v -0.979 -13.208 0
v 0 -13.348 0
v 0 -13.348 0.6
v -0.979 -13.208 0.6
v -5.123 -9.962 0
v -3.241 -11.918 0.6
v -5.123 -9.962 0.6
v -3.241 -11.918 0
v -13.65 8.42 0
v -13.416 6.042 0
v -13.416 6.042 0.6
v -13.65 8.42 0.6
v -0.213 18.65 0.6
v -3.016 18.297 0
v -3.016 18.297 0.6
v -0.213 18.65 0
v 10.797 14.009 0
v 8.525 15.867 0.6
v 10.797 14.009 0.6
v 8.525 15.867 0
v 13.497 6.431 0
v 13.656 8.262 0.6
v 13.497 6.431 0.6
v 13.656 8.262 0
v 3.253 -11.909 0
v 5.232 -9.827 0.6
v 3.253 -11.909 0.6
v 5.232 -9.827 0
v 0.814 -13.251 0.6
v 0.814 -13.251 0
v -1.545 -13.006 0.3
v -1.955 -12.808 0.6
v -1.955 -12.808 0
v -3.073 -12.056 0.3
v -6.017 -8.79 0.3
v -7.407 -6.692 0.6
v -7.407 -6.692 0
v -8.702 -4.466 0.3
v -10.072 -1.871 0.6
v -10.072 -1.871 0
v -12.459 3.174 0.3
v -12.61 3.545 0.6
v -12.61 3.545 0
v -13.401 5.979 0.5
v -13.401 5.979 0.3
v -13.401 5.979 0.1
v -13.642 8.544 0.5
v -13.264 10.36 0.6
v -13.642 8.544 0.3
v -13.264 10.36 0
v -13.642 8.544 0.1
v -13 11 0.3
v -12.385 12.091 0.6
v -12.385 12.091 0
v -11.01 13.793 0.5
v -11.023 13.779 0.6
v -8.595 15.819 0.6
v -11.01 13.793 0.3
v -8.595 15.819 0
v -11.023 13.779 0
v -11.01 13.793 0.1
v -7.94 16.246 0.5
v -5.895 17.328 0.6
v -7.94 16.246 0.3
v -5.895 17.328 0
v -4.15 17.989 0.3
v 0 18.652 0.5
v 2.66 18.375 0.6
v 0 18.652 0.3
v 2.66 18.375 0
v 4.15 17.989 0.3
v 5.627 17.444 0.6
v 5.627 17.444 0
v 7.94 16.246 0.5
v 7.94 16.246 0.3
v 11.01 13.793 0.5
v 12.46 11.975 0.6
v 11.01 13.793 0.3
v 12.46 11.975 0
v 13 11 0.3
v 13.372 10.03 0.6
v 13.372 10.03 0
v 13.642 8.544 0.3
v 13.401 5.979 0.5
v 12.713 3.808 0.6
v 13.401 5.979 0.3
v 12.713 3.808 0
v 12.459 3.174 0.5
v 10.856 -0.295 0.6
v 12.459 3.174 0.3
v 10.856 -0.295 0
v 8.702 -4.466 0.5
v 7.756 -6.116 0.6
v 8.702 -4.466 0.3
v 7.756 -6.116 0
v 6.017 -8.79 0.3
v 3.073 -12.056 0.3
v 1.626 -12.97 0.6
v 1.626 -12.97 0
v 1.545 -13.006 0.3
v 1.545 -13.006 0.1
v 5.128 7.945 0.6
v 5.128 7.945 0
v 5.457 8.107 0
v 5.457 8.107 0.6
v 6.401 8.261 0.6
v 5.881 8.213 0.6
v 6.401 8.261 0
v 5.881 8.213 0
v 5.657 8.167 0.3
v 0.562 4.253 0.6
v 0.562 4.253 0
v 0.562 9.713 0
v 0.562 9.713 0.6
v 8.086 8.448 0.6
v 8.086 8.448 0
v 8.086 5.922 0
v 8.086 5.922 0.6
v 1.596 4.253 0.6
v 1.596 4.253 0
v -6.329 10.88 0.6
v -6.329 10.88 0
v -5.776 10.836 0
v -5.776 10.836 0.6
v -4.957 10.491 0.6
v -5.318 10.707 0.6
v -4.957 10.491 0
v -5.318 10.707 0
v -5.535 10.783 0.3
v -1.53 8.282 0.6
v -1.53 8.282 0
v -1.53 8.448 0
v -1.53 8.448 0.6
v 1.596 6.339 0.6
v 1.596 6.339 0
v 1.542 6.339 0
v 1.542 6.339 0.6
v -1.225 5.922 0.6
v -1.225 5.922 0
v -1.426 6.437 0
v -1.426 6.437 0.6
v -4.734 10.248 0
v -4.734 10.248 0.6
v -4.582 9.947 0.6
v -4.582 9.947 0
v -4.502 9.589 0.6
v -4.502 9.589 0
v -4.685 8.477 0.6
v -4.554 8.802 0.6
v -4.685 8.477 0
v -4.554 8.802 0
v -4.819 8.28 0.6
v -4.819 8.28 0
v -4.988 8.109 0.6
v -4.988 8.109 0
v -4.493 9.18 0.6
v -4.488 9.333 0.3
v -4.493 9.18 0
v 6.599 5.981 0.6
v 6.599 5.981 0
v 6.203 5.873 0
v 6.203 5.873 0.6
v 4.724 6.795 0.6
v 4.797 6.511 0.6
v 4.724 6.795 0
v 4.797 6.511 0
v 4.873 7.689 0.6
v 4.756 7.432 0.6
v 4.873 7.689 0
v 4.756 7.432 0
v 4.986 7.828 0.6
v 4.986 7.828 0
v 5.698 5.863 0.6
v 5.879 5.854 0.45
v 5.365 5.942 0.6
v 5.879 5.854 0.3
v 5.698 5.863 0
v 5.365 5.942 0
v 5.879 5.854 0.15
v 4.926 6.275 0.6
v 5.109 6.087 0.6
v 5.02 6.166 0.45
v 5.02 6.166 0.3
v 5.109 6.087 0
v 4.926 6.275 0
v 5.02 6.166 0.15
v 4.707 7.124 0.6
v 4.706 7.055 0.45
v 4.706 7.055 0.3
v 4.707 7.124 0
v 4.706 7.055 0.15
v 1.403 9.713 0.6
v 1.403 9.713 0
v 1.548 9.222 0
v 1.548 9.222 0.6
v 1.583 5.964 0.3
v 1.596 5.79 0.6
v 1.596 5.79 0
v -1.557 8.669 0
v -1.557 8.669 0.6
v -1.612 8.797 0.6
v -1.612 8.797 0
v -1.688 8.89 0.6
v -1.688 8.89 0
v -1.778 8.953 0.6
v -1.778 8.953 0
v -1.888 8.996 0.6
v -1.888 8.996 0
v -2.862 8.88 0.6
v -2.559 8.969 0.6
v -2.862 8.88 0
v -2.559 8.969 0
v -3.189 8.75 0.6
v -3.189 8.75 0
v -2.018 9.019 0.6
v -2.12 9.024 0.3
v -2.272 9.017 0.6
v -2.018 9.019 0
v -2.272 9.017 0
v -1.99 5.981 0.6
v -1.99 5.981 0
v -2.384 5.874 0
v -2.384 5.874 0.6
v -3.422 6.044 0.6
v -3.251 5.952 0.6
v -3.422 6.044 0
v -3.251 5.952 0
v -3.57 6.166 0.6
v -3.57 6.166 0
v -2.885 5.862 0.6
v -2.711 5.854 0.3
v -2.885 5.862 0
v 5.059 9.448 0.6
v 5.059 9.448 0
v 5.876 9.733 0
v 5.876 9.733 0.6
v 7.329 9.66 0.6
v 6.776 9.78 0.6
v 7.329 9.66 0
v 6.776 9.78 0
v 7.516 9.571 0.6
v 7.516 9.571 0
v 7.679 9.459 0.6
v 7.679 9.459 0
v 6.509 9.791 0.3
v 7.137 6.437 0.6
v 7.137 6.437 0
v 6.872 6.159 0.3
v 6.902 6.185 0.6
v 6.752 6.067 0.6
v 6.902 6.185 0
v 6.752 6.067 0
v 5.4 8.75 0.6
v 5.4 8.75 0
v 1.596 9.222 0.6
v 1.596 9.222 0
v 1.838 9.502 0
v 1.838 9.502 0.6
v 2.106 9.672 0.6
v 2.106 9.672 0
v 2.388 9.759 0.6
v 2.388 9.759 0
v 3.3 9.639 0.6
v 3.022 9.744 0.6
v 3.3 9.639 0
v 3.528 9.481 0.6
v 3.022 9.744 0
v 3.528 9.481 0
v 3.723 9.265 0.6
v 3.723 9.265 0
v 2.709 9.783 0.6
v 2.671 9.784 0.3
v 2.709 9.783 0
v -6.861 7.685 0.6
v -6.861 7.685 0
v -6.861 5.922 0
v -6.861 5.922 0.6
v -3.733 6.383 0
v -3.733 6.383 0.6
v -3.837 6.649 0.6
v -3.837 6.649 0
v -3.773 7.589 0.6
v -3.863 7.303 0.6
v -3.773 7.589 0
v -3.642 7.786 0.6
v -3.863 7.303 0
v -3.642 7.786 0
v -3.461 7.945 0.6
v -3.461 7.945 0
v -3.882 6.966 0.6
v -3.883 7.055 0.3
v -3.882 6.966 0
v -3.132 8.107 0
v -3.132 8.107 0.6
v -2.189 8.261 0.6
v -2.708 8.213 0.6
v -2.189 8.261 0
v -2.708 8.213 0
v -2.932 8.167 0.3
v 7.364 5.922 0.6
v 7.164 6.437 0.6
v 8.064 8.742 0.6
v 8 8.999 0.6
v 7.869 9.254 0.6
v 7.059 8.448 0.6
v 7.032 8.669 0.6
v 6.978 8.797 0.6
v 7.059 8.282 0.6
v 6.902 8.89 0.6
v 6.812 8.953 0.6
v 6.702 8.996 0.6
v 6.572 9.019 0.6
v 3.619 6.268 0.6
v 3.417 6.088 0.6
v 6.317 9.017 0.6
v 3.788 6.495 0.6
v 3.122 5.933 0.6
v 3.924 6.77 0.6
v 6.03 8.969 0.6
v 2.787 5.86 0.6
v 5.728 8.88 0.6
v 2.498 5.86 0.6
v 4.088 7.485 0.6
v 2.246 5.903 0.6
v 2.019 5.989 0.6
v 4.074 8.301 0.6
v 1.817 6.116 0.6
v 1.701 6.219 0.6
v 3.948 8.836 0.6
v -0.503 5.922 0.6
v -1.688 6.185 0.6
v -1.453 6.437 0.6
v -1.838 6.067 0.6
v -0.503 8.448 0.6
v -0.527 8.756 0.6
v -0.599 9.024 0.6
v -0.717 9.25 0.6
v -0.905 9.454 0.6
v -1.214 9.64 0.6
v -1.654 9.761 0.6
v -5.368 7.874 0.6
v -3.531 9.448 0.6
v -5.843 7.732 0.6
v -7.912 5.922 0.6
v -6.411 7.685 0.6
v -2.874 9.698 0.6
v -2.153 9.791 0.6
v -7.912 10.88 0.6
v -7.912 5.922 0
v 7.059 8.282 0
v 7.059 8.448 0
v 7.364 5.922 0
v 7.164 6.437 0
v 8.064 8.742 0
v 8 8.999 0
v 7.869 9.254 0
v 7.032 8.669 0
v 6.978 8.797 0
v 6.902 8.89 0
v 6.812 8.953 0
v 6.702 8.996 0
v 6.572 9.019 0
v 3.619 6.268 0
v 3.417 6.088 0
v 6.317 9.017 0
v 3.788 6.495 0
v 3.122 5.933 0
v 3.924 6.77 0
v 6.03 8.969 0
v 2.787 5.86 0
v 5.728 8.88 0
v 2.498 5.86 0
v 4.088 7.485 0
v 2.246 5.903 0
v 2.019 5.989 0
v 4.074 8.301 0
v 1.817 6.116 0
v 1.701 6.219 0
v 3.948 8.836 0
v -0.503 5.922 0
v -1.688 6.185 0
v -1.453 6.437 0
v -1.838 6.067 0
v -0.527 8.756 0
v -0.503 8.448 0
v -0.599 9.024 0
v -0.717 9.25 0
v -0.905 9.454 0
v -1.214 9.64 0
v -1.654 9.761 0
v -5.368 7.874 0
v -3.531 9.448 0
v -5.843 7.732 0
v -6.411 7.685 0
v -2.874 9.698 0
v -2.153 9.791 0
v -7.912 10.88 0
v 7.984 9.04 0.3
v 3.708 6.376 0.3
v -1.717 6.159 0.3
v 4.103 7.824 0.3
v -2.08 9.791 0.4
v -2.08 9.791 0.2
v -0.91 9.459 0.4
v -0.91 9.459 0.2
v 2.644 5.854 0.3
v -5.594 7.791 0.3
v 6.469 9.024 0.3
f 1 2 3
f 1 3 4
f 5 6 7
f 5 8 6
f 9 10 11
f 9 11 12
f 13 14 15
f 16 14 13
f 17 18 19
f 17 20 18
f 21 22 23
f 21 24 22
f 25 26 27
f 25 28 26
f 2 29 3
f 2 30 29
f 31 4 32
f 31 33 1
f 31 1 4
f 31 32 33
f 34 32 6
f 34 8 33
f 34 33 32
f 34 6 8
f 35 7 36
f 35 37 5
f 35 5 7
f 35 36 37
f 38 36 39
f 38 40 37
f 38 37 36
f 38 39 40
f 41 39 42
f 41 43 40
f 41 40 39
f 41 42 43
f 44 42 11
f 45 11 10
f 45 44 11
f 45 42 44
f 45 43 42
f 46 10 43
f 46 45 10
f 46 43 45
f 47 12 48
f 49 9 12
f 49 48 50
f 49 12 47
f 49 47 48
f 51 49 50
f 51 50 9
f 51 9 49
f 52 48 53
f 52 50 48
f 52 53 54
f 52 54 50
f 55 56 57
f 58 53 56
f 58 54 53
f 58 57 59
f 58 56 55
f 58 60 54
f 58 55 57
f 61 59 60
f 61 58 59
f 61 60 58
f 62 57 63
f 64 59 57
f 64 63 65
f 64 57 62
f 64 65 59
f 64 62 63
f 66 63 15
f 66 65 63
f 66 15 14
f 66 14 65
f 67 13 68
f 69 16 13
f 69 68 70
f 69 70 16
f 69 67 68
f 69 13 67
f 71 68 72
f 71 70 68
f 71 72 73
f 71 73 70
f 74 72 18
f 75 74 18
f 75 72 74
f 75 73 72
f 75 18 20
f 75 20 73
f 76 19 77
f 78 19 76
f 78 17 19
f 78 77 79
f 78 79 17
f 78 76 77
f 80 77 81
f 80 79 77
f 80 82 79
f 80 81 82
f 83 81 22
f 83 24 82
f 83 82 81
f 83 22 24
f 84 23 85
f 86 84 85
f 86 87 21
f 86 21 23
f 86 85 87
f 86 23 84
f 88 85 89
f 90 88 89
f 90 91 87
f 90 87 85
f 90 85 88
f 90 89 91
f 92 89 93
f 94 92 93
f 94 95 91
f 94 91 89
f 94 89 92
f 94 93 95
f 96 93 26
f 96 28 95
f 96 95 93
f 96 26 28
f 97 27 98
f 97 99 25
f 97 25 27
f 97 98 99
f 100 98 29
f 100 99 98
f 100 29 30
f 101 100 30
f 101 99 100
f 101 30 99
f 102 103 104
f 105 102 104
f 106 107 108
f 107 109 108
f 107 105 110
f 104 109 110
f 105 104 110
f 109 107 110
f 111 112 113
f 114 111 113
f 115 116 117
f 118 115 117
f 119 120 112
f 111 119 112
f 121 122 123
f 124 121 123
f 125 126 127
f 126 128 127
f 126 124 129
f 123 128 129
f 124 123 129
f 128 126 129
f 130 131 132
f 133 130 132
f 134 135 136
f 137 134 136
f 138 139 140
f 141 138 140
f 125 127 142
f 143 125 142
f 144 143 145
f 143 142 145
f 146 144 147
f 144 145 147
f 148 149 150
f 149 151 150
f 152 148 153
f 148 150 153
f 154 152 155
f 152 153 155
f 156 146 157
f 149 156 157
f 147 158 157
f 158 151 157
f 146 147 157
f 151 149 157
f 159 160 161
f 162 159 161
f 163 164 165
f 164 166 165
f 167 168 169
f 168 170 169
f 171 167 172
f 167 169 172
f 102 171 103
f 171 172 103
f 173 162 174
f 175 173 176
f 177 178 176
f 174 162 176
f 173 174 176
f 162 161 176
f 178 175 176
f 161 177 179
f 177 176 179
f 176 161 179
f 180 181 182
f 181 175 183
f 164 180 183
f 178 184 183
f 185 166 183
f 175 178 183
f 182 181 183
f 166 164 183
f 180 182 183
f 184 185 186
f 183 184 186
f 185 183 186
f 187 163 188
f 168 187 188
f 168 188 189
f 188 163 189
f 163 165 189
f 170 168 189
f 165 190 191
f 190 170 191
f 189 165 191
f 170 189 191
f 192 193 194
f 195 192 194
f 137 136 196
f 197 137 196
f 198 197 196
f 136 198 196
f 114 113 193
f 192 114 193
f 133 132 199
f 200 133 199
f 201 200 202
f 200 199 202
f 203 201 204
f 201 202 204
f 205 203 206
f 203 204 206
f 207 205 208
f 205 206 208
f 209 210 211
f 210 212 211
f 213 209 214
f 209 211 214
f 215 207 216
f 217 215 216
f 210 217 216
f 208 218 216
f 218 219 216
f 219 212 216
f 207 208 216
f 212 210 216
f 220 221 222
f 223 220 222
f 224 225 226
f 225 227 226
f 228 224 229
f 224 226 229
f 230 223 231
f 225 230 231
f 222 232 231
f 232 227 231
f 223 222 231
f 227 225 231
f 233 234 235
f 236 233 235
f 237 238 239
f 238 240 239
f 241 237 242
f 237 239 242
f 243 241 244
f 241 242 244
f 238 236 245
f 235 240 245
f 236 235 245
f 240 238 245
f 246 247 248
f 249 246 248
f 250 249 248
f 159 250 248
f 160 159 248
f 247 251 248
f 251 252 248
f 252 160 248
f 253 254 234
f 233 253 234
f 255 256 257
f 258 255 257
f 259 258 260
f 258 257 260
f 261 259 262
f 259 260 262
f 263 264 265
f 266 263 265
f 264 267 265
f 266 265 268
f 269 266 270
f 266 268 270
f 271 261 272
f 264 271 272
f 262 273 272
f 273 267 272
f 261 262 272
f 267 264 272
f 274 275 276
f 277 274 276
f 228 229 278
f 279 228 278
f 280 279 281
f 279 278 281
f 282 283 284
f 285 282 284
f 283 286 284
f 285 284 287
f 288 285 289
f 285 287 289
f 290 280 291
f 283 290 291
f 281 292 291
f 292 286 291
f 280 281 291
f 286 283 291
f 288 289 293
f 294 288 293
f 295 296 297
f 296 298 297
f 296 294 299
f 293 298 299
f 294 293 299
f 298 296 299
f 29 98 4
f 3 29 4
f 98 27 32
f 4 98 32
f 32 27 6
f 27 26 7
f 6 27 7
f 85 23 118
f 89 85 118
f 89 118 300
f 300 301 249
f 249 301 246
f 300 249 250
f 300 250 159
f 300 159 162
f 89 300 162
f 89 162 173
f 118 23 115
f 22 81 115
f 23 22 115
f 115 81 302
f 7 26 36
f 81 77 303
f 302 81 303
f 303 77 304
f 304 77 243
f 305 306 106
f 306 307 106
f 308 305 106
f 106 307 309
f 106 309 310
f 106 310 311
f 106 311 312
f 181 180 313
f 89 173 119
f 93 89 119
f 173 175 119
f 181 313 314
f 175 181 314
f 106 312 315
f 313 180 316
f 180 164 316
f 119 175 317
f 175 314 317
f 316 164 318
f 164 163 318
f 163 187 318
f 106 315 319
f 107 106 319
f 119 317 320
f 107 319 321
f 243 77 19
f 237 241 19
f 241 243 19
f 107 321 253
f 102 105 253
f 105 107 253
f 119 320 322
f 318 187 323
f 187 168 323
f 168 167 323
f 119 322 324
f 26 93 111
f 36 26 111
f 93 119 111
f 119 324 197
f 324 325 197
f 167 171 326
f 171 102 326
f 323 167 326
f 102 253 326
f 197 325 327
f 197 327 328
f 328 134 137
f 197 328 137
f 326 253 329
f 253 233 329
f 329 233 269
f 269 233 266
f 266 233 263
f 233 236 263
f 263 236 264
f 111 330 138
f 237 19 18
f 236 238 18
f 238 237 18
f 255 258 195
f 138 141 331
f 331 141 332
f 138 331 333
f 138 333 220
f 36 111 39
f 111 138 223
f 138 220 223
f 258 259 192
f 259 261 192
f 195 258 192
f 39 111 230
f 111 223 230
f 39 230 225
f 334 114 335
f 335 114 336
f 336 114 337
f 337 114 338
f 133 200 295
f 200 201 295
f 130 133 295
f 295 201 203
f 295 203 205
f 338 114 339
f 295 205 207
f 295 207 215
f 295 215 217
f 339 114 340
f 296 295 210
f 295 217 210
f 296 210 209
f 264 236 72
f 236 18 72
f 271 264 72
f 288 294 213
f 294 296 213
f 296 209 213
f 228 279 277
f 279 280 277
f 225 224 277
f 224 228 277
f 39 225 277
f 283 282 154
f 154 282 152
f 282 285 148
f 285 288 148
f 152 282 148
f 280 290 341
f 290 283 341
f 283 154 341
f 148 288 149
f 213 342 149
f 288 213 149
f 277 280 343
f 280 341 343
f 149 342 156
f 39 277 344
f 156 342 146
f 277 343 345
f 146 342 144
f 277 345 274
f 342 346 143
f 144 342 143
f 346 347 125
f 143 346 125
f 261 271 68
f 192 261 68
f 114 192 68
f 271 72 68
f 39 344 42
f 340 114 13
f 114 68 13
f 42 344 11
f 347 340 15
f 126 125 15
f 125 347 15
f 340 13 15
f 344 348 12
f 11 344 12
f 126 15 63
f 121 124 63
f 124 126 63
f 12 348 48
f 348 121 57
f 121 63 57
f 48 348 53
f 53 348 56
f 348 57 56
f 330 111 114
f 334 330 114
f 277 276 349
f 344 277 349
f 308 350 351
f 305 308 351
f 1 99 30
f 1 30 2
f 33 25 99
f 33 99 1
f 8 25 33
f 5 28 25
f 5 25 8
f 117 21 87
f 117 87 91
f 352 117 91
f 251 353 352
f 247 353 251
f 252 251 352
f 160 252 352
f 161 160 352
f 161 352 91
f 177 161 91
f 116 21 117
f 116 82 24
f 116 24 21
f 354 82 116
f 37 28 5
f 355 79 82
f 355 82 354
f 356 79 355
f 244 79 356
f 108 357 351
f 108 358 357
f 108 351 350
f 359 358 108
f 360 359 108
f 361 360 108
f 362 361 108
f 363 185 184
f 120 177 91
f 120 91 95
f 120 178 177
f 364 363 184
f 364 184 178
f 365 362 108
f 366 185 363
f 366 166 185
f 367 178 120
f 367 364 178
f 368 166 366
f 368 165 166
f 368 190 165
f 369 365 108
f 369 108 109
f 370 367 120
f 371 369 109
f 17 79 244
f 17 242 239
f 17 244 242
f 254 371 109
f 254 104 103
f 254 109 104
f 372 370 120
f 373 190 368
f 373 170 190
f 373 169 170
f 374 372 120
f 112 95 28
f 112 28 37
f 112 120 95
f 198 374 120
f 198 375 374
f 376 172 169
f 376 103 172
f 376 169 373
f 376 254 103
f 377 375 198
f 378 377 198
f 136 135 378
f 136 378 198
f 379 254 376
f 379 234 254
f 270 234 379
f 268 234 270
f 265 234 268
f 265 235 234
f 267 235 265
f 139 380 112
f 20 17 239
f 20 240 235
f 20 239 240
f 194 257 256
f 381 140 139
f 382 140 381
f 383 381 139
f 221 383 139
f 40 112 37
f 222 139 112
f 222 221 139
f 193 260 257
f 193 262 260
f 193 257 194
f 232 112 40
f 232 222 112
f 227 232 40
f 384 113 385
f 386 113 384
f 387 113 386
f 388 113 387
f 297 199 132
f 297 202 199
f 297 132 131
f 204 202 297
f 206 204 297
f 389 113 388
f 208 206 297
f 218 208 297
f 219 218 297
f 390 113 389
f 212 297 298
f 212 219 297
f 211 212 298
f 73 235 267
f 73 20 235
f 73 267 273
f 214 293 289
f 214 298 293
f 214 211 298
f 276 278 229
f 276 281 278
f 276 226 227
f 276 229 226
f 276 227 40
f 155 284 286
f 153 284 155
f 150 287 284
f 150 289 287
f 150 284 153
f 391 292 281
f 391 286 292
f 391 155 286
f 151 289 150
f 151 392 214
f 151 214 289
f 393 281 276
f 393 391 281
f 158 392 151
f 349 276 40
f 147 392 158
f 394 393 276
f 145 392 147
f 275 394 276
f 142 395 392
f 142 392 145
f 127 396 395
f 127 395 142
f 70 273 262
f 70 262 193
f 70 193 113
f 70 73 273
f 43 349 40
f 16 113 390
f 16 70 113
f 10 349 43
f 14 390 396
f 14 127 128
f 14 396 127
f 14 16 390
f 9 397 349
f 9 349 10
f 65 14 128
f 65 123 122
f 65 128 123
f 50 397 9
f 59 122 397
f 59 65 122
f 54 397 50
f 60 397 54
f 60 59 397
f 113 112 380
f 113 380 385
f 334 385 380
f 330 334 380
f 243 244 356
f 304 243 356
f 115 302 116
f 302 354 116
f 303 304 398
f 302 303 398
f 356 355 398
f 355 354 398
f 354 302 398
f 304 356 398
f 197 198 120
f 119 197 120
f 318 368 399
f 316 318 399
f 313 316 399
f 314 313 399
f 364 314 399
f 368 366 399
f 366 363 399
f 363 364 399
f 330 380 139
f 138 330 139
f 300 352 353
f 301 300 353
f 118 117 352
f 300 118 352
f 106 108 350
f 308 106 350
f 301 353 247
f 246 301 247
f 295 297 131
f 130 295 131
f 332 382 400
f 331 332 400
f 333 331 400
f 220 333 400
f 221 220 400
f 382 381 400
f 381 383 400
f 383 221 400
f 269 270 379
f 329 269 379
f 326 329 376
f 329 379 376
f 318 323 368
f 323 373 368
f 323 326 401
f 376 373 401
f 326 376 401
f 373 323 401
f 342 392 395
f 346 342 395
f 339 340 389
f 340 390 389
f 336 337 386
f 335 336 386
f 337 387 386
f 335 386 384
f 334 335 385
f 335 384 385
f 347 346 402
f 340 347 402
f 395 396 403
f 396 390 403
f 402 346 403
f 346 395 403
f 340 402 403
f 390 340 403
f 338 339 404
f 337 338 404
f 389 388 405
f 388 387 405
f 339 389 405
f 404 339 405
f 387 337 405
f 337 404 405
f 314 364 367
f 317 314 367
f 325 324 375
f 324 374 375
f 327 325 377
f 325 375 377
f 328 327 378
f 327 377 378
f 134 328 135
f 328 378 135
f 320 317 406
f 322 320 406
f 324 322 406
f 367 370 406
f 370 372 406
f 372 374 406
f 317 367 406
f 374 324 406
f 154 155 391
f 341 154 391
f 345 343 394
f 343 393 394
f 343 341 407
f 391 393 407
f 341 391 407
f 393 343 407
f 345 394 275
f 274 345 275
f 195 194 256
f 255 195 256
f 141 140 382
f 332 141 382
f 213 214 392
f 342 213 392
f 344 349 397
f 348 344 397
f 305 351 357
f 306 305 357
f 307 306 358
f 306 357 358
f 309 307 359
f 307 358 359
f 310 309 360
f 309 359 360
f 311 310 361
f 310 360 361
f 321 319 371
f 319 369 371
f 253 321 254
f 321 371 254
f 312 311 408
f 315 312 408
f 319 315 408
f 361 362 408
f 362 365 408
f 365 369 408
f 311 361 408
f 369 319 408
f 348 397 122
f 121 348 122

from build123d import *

# Parameters (mm, degrees)
F1_DEPTH = 0.6


with BuildPart() as f1:
    # F0 (on Top) → F1 (new body)
    with BuildSketch(Plane.XY):
        with BuildLine():
            add(Edge.make_bspline(
                [(0, -13.3484860004), (-4.1261352973, -13.3484860004), (-11.5695883563, 0.5525926673), (-16.058339722, 11.46014805), (0, 22.5159383761), (16.058339722, 11.46014805), (11.5695883563, 0.5525926673), (4.1261352973, -13.3484860004), (0, -13.3484860004)],
                knots=[0, 0, 0, 0, 0.18262571, 0.3294525753, 0.5, 0.6705474247, 0.81737429, 1, 1, 1, 1], degree=3))
        make_face()
        with BuildLine():
            add(Edge.make_bspline(
                [(-4.9571397569, 10.4911963321), (-4.4878472222, 10.102741471), (-4.4878472222, 9.3334272349)],
                knots=[0, 0, 0, 1, 1, 1], degree=2))
            add(Edge.make_bspline(
                [(-4.4878472222, 9.3334272349), (-4.4878472222, 8.5326459849), (-4.9880642361, 8.1089263668)],
                knots=[0, 0, 0, 1, 1, 1], degree=2))
            add(Edge.make_bspline(
                [(-4.9880642361, 8.1089263668), (-5.48828125, 7.6852067488), (-6.4105902778, 7.6852067488)],
                knots=[0, 0, 0, 1, 1, 1], degree=2))
            Line((-6.4105902778, 7.6852067488), (-6.8608940972, 7.6852067488))
            Line((-6.8608940972, 7.6852067488), (-6.8608940972, 5.9219689015))
            Line((-6.8608940972, 5.9219689015), (-7.9123263889, 5.9219689015))
            Line((-7.9123263889, 5.9219689015), (-7.9123263889, 10.8796511932))
            Line((-7.9123263889, 10.8796511932), (-6.3292100694, 10.8796511932))
            add(Edge.make_bspline(
                [(-6.3292100694, 10.8796511932), (-5.4264322917, 10.8796511932), (-4.9571397569, 10.4911963321)],
                knots=[0, 0, 0, 1, 1, 1], degree=2))
        make_face(mode=Mode.SUBTRACT)
        with BuildLine():
            Line((-0.5034722222, 5.9219689015), (-1.2250434028, 5.9219689015))
            Line((-1.2250434028, 5.9219689015), (-1.42578125, 6.4373768876))
            Line((-1.42578125, 6.4373768876), (-1.4529079861, 6.4373768876))
            add(Edge.make_bspline(
                [(-1.4529079861, 6.4373768876), (-1.7133246528, 6.108600846), (-1.9900173611, 5.9811051863)],
                knots=[0, 0, 0, 1, 1, 1], degree=2))
            add(Edge.make_bspline(
                [(-1.9900173611, 5.9811051863), (-2.2667100694, 5.8536095265), (-2.7105034722, 5.8536095265)],
                knots=[0, 0, 0, 1, 1, 1], degree=2))
            add(Edge.make_bspline(
                [(-2.7105034722, 5.8536095265), (-3.2562934028, 5.8536095265), (-3.5698784722, 6.1661095265)],
                knots=[0, 0, 0, 1, 1, 1], degree=2))
            add(Edge.make_bspline(
                [(-3.5698784722, 6.1661095265), (-3.8834635417, 6.4786095265), (-3.8834635417, 7.0547814015)],
                knots=[0, 0, 0, 1, 1, 1], degree=2))
            add(Edge.make_bspline(
                [(-3.8834635417, 7.0547814015), (-3.8834635417, 7.6580800126), (-3.4613715278, 7.944538346)],
                knots=[0, 0, 0, 1, 1, 1], degree=2))
            add(Edge.make_bspline(
                [(-3.4613715278, 7.944538346), (-3.0392795139, 8.2309966793), (-2.1885850694, 8.2613786238)],
                knots=[0, 0, 0, 1, 1, 1], degree=2))
            Line((-2.1885850694, 8.2613786238), (-1.5299479167, 8.2819949432))
            Line((-1.5299479167, 8.2819949432), (-1.5299479167, 8.4480105682))
            add(Edge.make_bspline(
                [(-1.5299479167, 8.4480105682), (-1.5299479167, 9.0241824432), (-2.1202256944, 9.0241824432)],
                knots=[0, 0, 0, 1, 1, 1], degree=2))
            add(Edge.make_bspline(
                [(-2.1202256944, 9.0241824432), (-2.5748697917, 9.0241824432), (-3.1890190972, 8.7496598738)],
                knots=[0, 0, 0, 1, 1, 1], degree=2))
            Line((-3.1890190972, 8.7496598738), (-3.5308159722, 9.448444596))
            add(Edge.make_bspline(
                [(-3.5308159722, 9.448444596), (-2.8765190972, 9.7913265404), (-2.080078125, 9.7913265404)],
                knots=[0, 0, 0, 1, 1, 1], degree=2))
            add(Edge.make_bspline(
                [(-2.080078125, 9.7913265404), (-1.3172743056, 9.7913265404), (-0.9103732639, 9.4587527557)],
                knots=[0, 0, 0, 1, 1, 1], degree=2))
            add(Edge.make_bspline(
                [(-0.9103732639, 9.4587527557), (-0.5034722222, 9.126178971), (-0.5034722222, 8.4480105682)],
                knots=[0, 0, 0, 1, 1, 1], degree=2))
            Line((-0.5034722222, 8.4480105682), (-0.5034722222, 5.9219689015))
        make_face(mode=Mode.SUBTRACT)
        with BuildLine():
            add(Edge.make_bspline(
                [(3.4168836806, 6.0879845265), (3.0881076389, 5.8536095265), (2.6443142361, 5.8536095265)],
                knots=[0, 0, 0, 1, 1, 1], degree=2))
            add(Edge.make_bspline(
                [(2.6443142361, 5.8536095265), (1.9759114583, 5.8536095265), (1.5961371528, 6.3386355682)],
                knots=[0, 0, 0, 1, 1, 1], degree=2))
            Line((1.5961371528, 6.3386355682), (1.5418836806, 6.3386355682))
            add(Edge.make_bspline(
                [(1.5418836806, 6.3386355682), (1.5961371528, 5.864460221), (1.5961371528, 5.7895904293)],
                knots=[0, 0, 0, 1, 1, 1], degree=2))
            Line((1.5961371528, 5.7895904293), (1.5961371528, 4.253132096))
            Line((1.5961371528, 4.253132096), (0.5620659722, 4.253132096))
            Line((0.5620659722, 4.253132096), (0.5620659722, 9.7132015404))
            Line((0.5620659722, 9.7132015404), (1.4029947917, 9.7132015404))
            Line((1.4029947917, 9.7132015404), (1.5483940972, 9.2216650821))
            Line((1.5483940972, 9.2216650821), (1.5961371528, 9.2216650821))
            add(Edge.make_bspline(
                [(1.5961371528, 9.2216650821), (1.9596354167, 9.7837310543), (2.6714409722, 9.7837310543)],
                knots=[0, 0, 0, 1, 1, 1], degree=2))
            add(Edge.make_bspline(
                [(2.6714409722, 9.7837310543), (3.3430989583, 9.7837310543), (3.7228732639, 9.2650678599)],
                knots=[0, 0, 0, 1, 1, 1], degree=2))
            add(Edge.make_bspline(
                [(3.7228732639, 9.2650678599), (4.1026475694, 8.7464046654), (4.1026475694, 7.8240956376)],
                knots=[0, 0, 0, 1, 1, 1], degree=2))
            add(Edge.make_bspline(
                [(4.1026475694, 7.8240956376), (4.1026475694, 7.2175418182), (3.9241536458, 6.7699506724)],
                knots=[0, 0, 0, 1, 1, 1], degree=2))
            add(Edge.make_bspline(
                [(3.9241536458, 6.7699506724), (3.7456597222, 6.3223595265), (3.4168836806, 6.0879845265)],
                knots=[0, 0, 0, 1, 1, 1], degree=2))
        make_face(mode=Mode.SUBTRACT)
        with BuildLine():
            Line((8.0859375, 5.9219689015), (7.3643663194, 5.9219689015))
            Line((7.3643663194, 5.9219689015), (7.1636284722, 6.4373768876))
            Line((7.1636284722, 6.4373768876), (7.1365017361, 6.4373768876))
            add(Edge.make_bspline(
                [(7.1365017361, 6.4373768876), (6.8760850694, 6.108600846), (6.5993923611, 5.9811051863)],
                knots=[0, 0, 0, 1, 1, 1], degree=2))
            add(Edge.make_bspline(
                [(6.5993923611, 5.9811051863), (6.3226996528, 5.8536095265), (5.87890625, 5.8536095265)],
                knots=[0, 0, 0, 1, 1, 1], degree=2))
            add(Edge.make_bspline(
                [(5.87890625, 5.8536095265), (5.3331163194, 5.8536095265), (5.01953125, 6.1661095265)],
                knots=[0, 0, 0, 1, 1, 1], degree=2))
            add(Edge.make_bspline(
                [(5.01953125, 6.1661095265), (4.7059461806, 6.4786095265), (4.7059461806, 7.0547814015)],
                knots=[0, 0, 0, 1, 1, 1], degree=2))
            add(Edge.make_bspline(
                [(4.7059461806, 7.0547814015), (4.7059461806, 7.6580800126), (5.1280381944, 7.944538346)],
                knots=[0, 0, 0, 1, 1, 1], degree=2))
            add(Edge.make_bspline(
                [(5.1280381944, 7.944538346), (5.5501302083, 8.2309966793), (6.4008246528, 8.2613786238)],
                knots=[0, 0, 0, 1, 1, 1], degree=2))
            Line((6.4008246528, 8.2613786238), (7.0594618056, 8.2819949432))
            Line((7.0594618056, 8.2819949432), (7.0594618056, 8.4480105682))
            add(Edge.make_bspline(
                [(7.0594618056, 8.4480105682), (7.0594618056, 9.0241824432), (6.4691840278, 9.0241824432)],
                knots=[0, 0, 0, 1, 1, 1], degree=2))
            add(Edge.make_bspline(
                [(6.4691840278, 9.0241824432), (6.0145399306, 9.0241824432), (5.400390625, 8.7496598738)],
                knots=[0, 0, 0, 1, 1, 1], degree=2))
            Line((5.400390625, 8.7496598738), (5.05859375, 9.448444596))
            add(Edge.make_bspline(
                [(5.05859375, 9.448444596), (5.712890625, 9.7913265404), (6.5093315972, 9.7913265404)],
                knots=[0, 0, 0, 1, 1, 1], degree=2))
            add(Edge.make_bspline(
                [(6.5093315972, 9.7913265404), (7.2721354167, 9.7913265404), (7.6790364583, 9.4587527557)],
                knots=[0, 0, 0, 1, 1, 1], degree=2))
            add(Edge.make_bspline(
                [(7.6790364583, 9.4587527557), (8.0859375, 9.126178971), (8.0859375, 8.4480105682)],
                knots=[0, 0, 0, 1, 1, 1], degree=2))
            Line((8.0859375, 8.4480105682), (8.0859375, 5.9219689015))
        make_face(mode=Mode.SUBTRACT)
    extrude(amount=F1_DEPTH)


solid = f1.part
